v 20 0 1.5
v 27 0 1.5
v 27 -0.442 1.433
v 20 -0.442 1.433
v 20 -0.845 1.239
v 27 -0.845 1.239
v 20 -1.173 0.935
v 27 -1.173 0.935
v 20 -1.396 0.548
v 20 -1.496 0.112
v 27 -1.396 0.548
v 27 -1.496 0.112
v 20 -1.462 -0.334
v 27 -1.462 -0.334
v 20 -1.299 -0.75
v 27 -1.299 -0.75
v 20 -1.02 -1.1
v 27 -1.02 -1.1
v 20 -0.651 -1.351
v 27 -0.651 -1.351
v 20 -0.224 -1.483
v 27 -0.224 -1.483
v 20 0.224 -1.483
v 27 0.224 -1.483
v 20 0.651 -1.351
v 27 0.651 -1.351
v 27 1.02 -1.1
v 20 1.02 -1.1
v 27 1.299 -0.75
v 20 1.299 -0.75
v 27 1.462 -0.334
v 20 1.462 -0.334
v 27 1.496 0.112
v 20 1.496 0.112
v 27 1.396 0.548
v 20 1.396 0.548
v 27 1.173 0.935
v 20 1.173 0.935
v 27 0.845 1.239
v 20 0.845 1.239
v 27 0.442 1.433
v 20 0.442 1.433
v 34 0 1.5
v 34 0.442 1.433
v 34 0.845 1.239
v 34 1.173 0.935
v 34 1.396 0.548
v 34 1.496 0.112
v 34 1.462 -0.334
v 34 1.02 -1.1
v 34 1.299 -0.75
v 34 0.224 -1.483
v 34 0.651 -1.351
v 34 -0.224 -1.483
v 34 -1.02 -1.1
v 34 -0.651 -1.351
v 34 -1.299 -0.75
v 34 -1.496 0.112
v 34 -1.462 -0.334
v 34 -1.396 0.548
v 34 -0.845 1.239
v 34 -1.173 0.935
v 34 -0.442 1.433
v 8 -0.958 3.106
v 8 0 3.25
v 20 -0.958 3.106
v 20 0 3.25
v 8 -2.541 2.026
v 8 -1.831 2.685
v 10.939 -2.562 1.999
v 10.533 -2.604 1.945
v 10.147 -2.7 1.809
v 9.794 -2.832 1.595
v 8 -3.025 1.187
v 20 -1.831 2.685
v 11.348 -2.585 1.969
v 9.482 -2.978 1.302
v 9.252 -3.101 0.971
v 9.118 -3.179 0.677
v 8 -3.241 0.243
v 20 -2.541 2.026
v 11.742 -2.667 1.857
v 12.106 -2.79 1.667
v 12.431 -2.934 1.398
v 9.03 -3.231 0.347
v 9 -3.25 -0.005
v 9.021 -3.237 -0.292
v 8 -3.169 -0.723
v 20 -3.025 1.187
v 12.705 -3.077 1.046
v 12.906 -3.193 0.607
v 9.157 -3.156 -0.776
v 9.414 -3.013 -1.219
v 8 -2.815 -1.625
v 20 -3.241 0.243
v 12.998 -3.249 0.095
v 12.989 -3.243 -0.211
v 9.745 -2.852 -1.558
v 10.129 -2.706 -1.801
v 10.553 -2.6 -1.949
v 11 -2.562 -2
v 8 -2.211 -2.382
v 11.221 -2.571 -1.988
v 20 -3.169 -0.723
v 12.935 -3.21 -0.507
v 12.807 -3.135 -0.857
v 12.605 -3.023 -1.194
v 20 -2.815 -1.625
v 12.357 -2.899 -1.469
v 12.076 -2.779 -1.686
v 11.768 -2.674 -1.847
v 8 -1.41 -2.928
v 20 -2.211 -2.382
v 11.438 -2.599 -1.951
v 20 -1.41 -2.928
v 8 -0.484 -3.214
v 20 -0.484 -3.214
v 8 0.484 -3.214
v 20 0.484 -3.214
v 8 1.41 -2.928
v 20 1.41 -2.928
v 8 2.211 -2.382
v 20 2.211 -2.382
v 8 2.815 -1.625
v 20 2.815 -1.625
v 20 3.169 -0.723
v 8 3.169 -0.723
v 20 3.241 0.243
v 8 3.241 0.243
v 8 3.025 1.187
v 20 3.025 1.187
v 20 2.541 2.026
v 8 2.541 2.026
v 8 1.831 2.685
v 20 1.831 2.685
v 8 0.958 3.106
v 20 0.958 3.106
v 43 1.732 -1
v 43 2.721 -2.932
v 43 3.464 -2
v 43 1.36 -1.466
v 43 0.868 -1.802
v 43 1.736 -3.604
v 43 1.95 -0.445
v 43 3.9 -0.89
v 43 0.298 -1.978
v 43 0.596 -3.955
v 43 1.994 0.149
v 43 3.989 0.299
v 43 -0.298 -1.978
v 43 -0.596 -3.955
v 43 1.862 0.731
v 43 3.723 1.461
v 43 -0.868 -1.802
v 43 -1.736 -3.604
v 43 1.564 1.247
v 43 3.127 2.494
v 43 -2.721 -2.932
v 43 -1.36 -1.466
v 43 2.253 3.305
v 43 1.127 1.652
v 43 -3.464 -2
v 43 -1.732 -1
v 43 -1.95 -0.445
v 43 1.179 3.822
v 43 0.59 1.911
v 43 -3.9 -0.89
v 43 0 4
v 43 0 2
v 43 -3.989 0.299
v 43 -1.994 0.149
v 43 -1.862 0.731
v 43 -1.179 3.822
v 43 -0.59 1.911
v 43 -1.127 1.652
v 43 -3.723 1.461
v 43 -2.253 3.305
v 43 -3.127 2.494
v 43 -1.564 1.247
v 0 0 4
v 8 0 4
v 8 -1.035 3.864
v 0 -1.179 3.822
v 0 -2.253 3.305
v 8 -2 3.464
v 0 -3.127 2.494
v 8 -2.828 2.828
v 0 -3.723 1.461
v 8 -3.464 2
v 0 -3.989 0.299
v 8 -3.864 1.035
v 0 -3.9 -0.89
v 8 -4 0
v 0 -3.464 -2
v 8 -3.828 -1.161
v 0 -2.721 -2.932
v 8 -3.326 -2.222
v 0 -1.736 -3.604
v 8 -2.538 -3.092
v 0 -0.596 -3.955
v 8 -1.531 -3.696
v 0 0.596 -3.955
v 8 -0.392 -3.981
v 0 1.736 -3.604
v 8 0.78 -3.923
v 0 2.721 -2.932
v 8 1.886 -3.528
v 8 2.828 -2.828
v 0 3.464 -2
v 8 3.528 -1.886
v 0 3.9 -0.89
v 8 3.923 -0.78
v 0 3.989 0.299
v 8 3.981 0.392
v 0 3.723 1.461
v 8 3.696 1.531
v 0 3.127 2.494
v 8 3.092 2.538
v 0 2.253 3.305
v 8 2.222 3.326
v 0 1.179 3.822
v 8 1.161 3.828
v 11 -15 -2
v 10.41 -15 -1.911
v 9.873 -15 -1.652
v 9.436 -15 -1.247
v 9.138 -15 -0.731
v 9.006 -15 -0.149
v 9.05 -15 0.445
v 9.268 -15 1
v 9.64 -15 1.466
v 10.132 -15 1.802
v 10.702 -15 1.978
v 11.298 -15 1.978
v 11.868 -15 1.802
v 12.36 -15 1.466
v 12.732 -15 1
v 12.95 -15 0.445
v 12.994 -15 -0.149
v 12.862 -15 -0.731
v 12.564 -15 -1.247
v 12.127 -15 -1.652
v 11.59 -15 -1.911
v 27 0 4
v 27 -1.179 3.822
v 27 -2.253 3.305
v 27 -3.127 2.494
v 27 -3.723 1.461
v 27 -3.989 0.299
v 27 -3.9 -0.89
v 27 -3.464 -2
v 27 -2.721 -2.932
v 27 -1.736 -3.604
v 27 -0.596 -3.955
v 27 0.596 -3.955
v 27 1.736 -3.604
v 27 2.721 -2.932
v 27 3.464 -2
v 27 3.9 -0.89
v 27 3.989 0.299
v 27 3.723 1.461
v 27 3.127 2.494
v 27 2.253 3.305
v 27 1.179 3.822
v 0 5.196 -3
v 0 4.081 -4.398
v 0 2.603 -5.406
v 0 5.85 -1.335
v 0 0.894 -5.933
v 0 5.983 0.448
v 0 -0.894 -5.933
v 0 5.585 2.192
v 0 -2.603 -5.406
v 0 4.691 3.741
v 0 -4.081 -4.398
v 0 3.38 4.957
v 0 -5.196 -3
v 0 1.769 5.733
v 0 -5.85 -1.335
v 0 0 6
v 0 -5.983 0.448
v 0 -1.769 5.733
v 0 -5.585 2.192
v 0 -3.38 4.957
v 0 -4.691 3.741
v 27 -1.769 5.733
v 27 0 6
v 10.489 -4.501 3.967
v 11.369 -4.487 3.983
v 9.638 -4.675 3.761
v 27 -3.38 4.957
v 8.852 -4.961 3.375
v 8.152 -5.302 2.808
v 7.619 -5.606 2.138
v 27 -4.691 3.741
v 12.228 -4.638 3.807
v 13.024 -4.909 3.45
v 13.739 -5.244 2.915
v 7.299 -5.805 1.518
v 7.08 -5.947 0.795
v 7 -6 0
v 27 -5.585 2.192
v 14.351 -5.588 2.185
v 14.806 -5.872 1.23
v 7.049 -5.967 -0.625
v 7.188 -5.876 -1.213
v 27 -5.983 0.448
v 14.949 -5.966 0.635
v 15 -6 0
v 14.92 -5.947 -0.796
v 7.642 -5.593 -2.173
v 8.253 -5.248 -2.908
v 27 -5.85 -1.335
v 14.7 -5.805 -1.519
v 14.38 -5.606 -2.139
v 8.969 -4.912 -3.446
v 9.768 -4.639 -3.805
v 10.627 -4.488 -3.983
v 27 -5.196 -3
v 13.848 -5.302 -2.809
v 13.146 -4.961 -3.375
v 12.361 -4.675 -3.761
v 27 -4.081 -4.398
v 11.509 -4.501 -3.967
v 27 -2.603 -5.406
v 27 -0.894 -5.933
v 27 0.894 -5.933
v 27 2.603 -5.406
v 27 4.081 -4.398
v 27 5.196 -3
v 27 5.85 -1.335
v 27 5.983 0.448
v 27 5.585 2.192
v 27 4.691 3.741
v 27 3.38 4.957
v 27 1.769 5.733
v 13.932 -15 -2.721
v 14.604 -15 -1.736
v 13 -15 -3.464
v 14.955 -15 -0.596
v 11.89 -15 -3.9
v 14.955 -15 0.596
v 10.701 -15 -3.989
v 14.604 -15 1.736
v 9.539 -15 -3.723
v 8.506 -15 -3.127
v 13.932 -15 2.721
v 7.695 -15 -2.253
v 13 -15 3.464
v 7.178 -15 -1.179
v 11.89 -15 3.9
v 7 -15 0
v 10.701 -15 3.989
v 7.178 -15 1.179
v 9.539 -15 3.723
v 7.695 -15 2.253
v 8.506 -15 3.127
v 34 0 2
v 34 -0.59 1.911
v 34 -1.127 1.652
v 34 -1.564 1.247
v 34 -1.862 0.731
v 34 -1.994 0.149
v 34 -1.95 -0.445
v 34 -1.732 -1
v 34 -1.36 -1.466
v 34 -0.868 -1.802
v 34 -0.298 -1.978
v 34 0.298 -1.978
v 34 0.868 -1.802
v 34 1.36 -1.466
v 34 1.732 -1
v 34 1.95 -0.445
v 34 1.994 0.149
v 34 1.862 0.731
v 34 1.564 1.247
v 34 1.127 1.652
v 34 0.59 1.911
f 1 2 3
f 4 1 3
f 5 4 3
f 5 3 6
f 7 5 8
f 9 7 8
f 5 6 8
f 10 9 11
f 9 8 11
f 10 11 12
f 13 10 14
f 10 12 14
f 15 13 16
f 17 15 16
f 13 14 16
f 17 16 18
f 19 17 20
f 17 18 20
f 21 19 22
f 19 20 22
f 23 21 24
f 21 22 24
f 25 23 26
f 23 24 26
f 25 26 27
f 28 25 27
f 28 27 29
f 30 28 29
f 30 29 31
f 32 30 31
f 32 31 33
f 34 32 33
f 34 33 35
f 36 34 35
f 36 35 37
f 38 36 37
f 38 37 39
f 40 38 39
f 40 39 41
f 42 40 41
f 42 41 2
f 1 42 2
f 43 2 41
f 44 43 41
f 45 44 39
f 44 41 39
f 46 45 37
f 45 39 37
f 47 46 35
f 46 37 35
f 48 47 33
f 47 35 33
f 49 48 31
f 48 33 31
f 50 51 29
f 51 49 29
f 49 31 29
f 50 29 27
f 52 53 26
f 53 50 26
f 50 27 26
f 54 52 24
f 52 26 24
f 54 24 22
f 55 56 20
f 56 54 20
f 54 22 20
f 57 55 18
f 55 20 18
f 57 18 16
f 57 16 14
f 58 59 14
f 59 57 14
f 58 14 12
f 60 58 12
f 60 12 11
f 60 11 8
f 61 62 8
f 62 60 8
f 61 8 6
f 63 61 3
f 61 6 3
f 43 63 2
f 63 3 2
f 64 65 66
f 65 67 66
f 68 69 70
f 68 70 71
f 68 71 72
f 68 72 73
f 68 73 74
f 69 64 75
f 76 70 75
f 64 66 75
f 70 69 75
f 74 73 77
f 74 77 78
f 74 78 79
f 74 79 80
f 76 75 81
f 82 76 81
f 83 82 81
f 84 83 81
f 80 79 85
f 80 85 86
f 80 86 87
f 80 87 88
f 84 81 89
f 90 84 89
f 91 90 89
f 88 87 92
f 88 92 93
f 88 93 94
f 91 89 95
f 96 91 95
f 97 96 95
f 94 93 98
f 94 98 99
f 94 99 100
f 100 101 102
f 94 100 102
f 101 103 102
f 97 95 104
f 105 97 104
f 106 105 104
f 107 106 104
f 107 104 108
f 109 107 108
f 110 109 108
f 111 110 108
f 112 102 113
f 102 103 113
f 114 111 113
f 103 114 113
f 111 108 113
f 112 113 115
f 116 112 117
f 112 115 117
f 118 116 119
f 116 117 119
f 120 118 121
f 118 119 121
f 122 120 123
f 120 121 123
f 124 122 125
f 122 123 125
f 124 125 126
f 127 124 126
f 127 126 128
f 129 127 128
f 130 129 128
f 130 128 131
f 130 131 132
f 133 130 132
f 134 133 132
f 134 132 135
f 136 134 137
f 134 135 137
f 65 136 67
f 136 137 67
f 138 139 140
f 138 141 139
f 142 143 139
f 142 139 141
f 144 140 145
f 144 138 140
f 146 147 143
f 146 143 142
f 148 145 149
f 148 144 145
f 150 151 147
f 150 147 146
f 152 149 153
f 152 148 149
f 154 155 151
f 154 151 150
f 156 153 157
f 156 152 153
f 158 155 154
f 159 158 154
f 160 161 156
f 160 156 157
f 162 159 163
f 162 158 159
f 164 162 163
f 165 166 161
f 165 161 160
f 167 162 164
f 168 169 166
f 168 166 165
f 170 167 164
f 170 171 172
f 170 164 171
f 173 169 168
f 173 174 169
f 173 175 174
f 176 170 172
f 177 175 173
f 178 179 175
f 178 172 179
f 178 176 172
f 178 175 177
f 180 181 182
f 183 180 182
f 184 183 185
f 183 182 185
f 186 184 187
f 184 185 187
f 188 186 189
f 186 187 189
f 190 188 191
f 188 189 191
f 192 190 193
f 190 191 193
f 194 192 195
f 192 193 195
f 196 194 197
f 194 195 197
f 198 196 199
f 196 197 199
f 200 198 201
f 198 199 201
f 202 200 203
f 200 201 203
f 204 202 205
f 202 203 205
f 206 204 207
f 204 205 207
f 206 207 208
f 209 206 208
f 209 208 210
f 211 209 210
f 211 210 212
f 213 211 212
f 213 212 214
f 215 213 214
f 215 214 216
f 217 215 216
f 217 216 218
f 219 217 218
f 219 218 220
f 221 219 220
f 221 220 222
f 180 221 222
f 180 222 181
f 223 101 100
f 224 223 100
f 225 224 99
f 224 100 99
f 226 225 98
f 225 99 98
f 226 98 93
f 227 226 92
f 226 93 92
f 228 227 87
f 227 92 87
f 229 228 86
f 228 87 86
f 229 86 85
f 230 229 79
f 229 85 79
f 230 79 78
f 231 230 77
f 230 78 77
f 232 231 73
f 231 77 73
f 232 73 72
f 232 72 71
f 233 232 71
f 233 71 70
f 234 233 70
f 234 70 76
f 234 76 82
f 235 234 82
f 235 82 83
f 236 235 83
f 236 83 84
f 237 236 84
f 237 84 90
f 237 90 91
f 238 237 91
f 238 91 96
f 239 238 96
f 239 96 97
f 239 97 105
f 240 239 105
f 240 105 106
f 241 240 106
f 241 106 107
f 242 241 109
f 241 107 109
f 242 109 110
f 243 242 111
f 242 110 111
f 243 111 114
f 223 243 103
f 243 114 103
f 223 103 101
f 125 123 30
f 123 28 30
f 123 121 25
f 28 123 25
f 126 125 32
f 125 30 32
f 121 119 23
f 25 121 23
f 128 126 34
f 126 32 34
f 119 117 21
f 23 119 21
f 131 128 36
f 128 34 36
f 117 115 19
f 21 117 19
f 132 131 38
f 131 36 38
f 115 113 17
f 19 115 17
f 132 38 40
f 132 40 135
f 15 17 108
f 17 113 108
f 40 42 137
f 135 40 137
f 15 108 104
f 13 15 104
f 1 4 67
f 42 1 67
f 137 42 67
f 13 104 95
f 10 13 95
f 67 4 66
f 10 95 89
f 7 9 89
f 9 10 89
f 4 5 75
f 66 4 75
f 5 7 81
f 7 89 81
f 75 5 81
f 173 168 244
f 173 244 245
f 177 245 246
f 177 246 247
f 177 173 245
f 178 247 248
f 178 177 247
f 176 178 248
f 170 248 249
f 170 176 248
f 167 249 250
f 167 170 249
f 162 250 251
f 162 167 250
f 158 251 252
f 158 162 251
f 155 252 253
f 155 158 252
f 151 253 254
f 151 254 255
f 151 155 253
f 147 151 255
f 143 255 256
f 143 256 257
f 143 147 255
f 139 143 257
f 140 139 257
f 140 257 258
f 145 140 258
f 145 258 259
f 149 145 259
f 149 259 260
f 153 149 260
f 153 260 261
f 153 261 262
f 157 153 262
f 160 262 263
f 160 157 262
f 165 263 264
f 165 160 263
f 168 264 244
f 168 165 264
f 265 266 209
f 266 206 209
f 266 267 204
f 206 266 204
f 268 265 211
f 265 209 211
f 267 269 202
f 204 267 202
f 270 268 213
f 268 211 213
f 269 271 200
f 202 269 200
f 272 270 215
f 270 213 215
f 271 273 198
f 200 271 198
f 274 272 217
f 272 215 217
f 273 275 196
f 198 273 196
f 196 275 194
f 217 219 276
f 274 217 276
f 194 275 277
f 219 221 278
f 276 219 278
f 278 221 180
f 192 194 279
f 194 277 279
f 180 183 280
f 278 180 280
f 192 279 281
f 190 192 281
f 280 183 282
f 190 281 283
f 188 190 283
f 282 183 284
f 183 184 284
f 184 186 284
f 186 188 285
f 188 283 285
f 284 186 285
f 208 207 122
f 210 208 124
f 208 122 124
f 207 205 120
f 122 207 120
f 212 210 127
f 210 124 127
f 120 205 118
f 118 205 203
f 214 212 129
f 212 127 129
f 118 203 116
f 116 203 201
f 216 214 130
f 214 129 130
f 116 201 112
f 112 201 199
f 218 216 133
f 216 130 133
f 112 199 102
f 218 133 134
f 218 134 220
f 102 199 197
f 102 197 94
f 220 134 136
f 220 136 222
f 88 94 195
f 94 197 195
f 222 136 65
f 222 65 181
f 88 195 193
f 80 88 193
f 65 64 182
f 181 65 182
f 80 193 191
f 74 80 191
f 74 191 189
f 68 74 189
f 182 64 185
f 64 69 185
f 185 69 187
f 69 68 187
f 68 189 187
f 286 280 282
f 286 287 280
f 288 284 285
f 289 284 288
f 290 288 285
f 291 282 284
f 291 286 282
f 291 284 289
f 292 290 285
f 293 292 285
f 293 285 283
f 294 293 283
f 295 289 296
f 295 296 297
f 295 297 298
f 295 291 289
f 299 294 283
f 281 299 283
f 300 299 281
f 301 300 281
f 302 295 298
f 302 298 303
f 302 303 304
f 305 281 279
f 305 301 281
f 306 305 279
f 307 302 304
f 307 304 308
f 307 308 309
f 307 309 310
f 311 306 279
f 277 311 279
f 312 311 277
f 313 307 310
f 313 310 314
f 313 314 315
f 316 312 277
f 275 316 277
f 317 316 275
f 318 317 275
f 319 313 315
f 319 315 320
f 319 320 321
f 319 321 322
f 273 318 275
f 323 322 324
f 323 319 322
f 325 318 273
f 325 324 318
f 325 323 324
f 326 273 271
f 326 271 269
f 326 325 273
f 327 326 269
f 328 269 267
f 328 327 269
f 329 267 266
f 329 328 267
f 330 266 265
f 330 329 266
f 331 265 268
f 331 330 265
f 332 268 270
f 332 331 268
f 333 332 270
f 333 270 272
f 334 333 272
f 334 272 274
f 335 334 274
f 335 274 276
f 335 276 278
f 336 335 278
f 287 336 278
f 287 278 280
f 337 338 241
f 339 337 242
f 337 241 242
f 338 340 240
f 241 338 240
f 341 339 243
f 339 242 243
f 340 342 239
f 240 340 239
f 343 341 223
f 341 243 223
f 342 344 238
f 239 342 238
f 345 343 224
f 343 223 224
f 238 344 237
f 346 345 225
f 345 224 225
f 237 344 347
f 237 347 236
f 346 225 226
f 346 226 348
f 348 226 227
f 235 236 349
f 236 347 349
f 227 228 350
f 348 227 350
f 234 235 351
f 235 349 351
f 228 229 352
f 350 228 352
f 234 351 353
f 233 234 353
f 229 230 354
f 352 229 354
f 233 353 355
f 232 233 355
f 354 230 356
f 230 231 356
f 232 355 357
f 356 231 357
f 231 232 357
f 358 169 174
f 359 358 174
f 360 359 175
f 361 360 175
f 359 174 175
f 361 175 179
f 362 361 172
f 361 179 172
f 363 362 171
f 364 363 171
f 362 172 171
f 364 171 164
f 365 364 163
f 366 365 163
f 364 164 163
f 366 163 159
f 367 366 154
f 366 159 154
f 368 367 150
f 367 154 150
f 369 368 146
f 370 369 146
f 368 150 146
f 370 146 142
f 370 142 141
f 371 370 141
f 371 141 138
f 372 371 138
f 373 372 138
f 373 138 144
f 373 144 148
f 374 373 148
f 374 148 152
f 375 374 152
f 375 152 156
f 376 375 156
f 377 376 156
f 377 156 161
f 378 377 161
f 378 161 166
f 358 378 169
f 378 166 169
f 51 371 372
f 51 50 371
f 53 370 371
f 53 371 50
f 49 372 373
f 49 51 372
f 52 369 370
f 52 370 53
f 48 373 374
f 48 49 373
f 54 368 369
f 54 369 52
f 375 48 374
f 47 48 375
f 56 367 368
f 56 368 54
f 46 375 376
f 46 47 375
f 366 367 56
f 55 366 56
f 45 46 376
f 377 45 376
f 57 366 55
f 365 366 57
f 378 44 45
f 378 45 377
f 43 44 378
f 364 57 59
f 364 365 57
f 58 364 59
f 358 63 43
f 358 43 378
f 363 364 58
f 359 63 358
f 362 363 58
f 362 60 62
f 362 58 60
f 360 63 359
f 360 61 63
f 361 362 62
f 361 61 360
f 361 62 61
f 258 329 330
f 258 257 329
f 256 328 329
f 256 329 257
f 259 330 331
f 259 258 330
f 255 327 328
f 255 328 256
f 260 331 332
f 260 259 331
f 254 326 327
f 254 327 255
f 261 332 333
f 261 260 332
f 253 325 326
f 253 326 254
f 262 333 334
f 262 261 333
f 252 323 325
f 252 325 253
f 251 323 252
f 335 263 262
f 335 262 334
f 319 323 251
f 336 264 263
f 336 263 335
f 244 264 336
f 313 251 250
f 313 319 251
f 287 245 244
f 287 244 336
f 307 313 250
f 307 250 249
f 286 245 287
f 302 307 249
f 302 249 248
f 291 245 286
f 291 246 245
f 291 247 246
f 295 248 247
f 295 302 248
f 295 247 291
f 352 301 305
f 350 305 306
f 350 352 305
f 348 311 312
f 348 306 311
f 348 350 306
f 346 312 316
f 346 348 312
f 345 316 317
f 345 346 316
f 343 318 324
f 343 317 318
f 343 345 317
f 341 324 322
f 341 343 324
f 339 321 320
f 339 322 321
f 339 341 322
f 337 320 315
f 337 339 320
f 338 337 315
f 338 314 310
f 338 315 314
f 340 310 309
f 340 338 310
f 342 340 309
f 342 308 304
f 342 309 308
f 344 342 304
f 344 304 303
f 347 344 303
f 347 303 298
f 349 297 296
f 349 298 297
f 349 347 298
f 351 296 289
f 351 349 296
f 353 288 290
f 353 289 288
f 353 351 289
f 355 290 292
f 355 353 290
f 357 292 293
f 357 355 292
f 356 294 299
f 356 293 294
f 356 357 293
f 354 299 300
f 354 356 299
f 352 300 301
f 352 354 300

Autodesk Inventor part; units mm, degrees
ref_plane "YZ Plane" through (0, 0, 0) normal (1, 0, 0) x (0, 1, 0)
ref_plane "XY Plane" through (0, 0, 0) normal (0, 0, 1) x (1, 0, 0)
sketch "Sketch1" plane through (0, 0, 0) normal (0, 1, 0) x (-1, 0, 0)
  line L0 (0, 0) -> (-52, 0)
  line L1 (0, 4) -> (-8, 4)
  line L2 (0, 6) -> (-27, 6)
  line L3 (0, 0) -> (0, 37) construction
  line L4 (-8, 3.25) -> (-20, 3.25)
  line L5 (-8, 4) -> (-8, 3.25)
  line L6 (-20, 1.5) -> (-27, 1.5)
  line L7 (-20, 3.25) -> (-20, 1.5)
  line L8 (-27, 6) -> (-27, 4)
  line L9 (-27, 4) -> (-43, 4)
  line L10 (-34, 2) -> (-43, 2)
  line L11 (-43, 4) -> (-43, 2)
  line L12 (-34, 2) -> (-34, 1.5)
  line L13 (-34, 1.5) -> (-27, 1.5)
  line L14 (0, 6) -> (0, 4)
  point P0 (-8, 3.625)
  dimension "d0" = 8
  dimension "d1" = 12
  dimension "d2" = 27
  dimension "d3" = 6.5
  dimension "d4" = 8
  dimension "d5" = 20
  dimension "d6" = 3
  dimension "d7" = 8
  dimension "d8" = 16
  dimension "d9" = 4
  dimension "d10" = 9
revolve "Revolution1" add sketch "Sketch1" angle 360 about axis through (0, 0, 0) along (1, 0, 0)
thread "Thread1" size "M8x1.25" class "6g" standard "ANSI Metric M Profile" full length
thread "Thread2" size "M8x1.25" class "6H" standard "ANSI Metric M Profile" full length
ref_plane "Work Plane1" through (13.5, -6, 0) normal (0, 1, 0) x (-1, 0, 0)
sketch "Sketch2" plane through (13.5, -6, 0) normal (0, 1, 0) x (-1, 0, 0)
  circle A0 centre (2.5, 0) radius 4
  line L0 (13.5, 6) -> (13.5, -6) projected
  line L1 (13.5, 0) -> (-13.5, 0)
  line L2 (-13.5, 6) -> (-13.5, -6) projected
  dimension "d16" = 8
  dimension "d17" = 7
extrude "Extrusion1" add sketch "Sketch2" against normal blind 9
sketch "Sketch3" plane through (11, -15, 0) normal (0, -1, 0) x (1, 0, 0)
  circle A0 centre (0, 0) radius 4 projected
  point P0 (-11, 0)
extrude "Extrusion2" add sketch "Sketch2" along normal blind 2
hole "Hole2" at (11, -15, 0) direction (0, 1, 0) diameter 4 end up to surface
properties part number "HUDSON-1-81"
